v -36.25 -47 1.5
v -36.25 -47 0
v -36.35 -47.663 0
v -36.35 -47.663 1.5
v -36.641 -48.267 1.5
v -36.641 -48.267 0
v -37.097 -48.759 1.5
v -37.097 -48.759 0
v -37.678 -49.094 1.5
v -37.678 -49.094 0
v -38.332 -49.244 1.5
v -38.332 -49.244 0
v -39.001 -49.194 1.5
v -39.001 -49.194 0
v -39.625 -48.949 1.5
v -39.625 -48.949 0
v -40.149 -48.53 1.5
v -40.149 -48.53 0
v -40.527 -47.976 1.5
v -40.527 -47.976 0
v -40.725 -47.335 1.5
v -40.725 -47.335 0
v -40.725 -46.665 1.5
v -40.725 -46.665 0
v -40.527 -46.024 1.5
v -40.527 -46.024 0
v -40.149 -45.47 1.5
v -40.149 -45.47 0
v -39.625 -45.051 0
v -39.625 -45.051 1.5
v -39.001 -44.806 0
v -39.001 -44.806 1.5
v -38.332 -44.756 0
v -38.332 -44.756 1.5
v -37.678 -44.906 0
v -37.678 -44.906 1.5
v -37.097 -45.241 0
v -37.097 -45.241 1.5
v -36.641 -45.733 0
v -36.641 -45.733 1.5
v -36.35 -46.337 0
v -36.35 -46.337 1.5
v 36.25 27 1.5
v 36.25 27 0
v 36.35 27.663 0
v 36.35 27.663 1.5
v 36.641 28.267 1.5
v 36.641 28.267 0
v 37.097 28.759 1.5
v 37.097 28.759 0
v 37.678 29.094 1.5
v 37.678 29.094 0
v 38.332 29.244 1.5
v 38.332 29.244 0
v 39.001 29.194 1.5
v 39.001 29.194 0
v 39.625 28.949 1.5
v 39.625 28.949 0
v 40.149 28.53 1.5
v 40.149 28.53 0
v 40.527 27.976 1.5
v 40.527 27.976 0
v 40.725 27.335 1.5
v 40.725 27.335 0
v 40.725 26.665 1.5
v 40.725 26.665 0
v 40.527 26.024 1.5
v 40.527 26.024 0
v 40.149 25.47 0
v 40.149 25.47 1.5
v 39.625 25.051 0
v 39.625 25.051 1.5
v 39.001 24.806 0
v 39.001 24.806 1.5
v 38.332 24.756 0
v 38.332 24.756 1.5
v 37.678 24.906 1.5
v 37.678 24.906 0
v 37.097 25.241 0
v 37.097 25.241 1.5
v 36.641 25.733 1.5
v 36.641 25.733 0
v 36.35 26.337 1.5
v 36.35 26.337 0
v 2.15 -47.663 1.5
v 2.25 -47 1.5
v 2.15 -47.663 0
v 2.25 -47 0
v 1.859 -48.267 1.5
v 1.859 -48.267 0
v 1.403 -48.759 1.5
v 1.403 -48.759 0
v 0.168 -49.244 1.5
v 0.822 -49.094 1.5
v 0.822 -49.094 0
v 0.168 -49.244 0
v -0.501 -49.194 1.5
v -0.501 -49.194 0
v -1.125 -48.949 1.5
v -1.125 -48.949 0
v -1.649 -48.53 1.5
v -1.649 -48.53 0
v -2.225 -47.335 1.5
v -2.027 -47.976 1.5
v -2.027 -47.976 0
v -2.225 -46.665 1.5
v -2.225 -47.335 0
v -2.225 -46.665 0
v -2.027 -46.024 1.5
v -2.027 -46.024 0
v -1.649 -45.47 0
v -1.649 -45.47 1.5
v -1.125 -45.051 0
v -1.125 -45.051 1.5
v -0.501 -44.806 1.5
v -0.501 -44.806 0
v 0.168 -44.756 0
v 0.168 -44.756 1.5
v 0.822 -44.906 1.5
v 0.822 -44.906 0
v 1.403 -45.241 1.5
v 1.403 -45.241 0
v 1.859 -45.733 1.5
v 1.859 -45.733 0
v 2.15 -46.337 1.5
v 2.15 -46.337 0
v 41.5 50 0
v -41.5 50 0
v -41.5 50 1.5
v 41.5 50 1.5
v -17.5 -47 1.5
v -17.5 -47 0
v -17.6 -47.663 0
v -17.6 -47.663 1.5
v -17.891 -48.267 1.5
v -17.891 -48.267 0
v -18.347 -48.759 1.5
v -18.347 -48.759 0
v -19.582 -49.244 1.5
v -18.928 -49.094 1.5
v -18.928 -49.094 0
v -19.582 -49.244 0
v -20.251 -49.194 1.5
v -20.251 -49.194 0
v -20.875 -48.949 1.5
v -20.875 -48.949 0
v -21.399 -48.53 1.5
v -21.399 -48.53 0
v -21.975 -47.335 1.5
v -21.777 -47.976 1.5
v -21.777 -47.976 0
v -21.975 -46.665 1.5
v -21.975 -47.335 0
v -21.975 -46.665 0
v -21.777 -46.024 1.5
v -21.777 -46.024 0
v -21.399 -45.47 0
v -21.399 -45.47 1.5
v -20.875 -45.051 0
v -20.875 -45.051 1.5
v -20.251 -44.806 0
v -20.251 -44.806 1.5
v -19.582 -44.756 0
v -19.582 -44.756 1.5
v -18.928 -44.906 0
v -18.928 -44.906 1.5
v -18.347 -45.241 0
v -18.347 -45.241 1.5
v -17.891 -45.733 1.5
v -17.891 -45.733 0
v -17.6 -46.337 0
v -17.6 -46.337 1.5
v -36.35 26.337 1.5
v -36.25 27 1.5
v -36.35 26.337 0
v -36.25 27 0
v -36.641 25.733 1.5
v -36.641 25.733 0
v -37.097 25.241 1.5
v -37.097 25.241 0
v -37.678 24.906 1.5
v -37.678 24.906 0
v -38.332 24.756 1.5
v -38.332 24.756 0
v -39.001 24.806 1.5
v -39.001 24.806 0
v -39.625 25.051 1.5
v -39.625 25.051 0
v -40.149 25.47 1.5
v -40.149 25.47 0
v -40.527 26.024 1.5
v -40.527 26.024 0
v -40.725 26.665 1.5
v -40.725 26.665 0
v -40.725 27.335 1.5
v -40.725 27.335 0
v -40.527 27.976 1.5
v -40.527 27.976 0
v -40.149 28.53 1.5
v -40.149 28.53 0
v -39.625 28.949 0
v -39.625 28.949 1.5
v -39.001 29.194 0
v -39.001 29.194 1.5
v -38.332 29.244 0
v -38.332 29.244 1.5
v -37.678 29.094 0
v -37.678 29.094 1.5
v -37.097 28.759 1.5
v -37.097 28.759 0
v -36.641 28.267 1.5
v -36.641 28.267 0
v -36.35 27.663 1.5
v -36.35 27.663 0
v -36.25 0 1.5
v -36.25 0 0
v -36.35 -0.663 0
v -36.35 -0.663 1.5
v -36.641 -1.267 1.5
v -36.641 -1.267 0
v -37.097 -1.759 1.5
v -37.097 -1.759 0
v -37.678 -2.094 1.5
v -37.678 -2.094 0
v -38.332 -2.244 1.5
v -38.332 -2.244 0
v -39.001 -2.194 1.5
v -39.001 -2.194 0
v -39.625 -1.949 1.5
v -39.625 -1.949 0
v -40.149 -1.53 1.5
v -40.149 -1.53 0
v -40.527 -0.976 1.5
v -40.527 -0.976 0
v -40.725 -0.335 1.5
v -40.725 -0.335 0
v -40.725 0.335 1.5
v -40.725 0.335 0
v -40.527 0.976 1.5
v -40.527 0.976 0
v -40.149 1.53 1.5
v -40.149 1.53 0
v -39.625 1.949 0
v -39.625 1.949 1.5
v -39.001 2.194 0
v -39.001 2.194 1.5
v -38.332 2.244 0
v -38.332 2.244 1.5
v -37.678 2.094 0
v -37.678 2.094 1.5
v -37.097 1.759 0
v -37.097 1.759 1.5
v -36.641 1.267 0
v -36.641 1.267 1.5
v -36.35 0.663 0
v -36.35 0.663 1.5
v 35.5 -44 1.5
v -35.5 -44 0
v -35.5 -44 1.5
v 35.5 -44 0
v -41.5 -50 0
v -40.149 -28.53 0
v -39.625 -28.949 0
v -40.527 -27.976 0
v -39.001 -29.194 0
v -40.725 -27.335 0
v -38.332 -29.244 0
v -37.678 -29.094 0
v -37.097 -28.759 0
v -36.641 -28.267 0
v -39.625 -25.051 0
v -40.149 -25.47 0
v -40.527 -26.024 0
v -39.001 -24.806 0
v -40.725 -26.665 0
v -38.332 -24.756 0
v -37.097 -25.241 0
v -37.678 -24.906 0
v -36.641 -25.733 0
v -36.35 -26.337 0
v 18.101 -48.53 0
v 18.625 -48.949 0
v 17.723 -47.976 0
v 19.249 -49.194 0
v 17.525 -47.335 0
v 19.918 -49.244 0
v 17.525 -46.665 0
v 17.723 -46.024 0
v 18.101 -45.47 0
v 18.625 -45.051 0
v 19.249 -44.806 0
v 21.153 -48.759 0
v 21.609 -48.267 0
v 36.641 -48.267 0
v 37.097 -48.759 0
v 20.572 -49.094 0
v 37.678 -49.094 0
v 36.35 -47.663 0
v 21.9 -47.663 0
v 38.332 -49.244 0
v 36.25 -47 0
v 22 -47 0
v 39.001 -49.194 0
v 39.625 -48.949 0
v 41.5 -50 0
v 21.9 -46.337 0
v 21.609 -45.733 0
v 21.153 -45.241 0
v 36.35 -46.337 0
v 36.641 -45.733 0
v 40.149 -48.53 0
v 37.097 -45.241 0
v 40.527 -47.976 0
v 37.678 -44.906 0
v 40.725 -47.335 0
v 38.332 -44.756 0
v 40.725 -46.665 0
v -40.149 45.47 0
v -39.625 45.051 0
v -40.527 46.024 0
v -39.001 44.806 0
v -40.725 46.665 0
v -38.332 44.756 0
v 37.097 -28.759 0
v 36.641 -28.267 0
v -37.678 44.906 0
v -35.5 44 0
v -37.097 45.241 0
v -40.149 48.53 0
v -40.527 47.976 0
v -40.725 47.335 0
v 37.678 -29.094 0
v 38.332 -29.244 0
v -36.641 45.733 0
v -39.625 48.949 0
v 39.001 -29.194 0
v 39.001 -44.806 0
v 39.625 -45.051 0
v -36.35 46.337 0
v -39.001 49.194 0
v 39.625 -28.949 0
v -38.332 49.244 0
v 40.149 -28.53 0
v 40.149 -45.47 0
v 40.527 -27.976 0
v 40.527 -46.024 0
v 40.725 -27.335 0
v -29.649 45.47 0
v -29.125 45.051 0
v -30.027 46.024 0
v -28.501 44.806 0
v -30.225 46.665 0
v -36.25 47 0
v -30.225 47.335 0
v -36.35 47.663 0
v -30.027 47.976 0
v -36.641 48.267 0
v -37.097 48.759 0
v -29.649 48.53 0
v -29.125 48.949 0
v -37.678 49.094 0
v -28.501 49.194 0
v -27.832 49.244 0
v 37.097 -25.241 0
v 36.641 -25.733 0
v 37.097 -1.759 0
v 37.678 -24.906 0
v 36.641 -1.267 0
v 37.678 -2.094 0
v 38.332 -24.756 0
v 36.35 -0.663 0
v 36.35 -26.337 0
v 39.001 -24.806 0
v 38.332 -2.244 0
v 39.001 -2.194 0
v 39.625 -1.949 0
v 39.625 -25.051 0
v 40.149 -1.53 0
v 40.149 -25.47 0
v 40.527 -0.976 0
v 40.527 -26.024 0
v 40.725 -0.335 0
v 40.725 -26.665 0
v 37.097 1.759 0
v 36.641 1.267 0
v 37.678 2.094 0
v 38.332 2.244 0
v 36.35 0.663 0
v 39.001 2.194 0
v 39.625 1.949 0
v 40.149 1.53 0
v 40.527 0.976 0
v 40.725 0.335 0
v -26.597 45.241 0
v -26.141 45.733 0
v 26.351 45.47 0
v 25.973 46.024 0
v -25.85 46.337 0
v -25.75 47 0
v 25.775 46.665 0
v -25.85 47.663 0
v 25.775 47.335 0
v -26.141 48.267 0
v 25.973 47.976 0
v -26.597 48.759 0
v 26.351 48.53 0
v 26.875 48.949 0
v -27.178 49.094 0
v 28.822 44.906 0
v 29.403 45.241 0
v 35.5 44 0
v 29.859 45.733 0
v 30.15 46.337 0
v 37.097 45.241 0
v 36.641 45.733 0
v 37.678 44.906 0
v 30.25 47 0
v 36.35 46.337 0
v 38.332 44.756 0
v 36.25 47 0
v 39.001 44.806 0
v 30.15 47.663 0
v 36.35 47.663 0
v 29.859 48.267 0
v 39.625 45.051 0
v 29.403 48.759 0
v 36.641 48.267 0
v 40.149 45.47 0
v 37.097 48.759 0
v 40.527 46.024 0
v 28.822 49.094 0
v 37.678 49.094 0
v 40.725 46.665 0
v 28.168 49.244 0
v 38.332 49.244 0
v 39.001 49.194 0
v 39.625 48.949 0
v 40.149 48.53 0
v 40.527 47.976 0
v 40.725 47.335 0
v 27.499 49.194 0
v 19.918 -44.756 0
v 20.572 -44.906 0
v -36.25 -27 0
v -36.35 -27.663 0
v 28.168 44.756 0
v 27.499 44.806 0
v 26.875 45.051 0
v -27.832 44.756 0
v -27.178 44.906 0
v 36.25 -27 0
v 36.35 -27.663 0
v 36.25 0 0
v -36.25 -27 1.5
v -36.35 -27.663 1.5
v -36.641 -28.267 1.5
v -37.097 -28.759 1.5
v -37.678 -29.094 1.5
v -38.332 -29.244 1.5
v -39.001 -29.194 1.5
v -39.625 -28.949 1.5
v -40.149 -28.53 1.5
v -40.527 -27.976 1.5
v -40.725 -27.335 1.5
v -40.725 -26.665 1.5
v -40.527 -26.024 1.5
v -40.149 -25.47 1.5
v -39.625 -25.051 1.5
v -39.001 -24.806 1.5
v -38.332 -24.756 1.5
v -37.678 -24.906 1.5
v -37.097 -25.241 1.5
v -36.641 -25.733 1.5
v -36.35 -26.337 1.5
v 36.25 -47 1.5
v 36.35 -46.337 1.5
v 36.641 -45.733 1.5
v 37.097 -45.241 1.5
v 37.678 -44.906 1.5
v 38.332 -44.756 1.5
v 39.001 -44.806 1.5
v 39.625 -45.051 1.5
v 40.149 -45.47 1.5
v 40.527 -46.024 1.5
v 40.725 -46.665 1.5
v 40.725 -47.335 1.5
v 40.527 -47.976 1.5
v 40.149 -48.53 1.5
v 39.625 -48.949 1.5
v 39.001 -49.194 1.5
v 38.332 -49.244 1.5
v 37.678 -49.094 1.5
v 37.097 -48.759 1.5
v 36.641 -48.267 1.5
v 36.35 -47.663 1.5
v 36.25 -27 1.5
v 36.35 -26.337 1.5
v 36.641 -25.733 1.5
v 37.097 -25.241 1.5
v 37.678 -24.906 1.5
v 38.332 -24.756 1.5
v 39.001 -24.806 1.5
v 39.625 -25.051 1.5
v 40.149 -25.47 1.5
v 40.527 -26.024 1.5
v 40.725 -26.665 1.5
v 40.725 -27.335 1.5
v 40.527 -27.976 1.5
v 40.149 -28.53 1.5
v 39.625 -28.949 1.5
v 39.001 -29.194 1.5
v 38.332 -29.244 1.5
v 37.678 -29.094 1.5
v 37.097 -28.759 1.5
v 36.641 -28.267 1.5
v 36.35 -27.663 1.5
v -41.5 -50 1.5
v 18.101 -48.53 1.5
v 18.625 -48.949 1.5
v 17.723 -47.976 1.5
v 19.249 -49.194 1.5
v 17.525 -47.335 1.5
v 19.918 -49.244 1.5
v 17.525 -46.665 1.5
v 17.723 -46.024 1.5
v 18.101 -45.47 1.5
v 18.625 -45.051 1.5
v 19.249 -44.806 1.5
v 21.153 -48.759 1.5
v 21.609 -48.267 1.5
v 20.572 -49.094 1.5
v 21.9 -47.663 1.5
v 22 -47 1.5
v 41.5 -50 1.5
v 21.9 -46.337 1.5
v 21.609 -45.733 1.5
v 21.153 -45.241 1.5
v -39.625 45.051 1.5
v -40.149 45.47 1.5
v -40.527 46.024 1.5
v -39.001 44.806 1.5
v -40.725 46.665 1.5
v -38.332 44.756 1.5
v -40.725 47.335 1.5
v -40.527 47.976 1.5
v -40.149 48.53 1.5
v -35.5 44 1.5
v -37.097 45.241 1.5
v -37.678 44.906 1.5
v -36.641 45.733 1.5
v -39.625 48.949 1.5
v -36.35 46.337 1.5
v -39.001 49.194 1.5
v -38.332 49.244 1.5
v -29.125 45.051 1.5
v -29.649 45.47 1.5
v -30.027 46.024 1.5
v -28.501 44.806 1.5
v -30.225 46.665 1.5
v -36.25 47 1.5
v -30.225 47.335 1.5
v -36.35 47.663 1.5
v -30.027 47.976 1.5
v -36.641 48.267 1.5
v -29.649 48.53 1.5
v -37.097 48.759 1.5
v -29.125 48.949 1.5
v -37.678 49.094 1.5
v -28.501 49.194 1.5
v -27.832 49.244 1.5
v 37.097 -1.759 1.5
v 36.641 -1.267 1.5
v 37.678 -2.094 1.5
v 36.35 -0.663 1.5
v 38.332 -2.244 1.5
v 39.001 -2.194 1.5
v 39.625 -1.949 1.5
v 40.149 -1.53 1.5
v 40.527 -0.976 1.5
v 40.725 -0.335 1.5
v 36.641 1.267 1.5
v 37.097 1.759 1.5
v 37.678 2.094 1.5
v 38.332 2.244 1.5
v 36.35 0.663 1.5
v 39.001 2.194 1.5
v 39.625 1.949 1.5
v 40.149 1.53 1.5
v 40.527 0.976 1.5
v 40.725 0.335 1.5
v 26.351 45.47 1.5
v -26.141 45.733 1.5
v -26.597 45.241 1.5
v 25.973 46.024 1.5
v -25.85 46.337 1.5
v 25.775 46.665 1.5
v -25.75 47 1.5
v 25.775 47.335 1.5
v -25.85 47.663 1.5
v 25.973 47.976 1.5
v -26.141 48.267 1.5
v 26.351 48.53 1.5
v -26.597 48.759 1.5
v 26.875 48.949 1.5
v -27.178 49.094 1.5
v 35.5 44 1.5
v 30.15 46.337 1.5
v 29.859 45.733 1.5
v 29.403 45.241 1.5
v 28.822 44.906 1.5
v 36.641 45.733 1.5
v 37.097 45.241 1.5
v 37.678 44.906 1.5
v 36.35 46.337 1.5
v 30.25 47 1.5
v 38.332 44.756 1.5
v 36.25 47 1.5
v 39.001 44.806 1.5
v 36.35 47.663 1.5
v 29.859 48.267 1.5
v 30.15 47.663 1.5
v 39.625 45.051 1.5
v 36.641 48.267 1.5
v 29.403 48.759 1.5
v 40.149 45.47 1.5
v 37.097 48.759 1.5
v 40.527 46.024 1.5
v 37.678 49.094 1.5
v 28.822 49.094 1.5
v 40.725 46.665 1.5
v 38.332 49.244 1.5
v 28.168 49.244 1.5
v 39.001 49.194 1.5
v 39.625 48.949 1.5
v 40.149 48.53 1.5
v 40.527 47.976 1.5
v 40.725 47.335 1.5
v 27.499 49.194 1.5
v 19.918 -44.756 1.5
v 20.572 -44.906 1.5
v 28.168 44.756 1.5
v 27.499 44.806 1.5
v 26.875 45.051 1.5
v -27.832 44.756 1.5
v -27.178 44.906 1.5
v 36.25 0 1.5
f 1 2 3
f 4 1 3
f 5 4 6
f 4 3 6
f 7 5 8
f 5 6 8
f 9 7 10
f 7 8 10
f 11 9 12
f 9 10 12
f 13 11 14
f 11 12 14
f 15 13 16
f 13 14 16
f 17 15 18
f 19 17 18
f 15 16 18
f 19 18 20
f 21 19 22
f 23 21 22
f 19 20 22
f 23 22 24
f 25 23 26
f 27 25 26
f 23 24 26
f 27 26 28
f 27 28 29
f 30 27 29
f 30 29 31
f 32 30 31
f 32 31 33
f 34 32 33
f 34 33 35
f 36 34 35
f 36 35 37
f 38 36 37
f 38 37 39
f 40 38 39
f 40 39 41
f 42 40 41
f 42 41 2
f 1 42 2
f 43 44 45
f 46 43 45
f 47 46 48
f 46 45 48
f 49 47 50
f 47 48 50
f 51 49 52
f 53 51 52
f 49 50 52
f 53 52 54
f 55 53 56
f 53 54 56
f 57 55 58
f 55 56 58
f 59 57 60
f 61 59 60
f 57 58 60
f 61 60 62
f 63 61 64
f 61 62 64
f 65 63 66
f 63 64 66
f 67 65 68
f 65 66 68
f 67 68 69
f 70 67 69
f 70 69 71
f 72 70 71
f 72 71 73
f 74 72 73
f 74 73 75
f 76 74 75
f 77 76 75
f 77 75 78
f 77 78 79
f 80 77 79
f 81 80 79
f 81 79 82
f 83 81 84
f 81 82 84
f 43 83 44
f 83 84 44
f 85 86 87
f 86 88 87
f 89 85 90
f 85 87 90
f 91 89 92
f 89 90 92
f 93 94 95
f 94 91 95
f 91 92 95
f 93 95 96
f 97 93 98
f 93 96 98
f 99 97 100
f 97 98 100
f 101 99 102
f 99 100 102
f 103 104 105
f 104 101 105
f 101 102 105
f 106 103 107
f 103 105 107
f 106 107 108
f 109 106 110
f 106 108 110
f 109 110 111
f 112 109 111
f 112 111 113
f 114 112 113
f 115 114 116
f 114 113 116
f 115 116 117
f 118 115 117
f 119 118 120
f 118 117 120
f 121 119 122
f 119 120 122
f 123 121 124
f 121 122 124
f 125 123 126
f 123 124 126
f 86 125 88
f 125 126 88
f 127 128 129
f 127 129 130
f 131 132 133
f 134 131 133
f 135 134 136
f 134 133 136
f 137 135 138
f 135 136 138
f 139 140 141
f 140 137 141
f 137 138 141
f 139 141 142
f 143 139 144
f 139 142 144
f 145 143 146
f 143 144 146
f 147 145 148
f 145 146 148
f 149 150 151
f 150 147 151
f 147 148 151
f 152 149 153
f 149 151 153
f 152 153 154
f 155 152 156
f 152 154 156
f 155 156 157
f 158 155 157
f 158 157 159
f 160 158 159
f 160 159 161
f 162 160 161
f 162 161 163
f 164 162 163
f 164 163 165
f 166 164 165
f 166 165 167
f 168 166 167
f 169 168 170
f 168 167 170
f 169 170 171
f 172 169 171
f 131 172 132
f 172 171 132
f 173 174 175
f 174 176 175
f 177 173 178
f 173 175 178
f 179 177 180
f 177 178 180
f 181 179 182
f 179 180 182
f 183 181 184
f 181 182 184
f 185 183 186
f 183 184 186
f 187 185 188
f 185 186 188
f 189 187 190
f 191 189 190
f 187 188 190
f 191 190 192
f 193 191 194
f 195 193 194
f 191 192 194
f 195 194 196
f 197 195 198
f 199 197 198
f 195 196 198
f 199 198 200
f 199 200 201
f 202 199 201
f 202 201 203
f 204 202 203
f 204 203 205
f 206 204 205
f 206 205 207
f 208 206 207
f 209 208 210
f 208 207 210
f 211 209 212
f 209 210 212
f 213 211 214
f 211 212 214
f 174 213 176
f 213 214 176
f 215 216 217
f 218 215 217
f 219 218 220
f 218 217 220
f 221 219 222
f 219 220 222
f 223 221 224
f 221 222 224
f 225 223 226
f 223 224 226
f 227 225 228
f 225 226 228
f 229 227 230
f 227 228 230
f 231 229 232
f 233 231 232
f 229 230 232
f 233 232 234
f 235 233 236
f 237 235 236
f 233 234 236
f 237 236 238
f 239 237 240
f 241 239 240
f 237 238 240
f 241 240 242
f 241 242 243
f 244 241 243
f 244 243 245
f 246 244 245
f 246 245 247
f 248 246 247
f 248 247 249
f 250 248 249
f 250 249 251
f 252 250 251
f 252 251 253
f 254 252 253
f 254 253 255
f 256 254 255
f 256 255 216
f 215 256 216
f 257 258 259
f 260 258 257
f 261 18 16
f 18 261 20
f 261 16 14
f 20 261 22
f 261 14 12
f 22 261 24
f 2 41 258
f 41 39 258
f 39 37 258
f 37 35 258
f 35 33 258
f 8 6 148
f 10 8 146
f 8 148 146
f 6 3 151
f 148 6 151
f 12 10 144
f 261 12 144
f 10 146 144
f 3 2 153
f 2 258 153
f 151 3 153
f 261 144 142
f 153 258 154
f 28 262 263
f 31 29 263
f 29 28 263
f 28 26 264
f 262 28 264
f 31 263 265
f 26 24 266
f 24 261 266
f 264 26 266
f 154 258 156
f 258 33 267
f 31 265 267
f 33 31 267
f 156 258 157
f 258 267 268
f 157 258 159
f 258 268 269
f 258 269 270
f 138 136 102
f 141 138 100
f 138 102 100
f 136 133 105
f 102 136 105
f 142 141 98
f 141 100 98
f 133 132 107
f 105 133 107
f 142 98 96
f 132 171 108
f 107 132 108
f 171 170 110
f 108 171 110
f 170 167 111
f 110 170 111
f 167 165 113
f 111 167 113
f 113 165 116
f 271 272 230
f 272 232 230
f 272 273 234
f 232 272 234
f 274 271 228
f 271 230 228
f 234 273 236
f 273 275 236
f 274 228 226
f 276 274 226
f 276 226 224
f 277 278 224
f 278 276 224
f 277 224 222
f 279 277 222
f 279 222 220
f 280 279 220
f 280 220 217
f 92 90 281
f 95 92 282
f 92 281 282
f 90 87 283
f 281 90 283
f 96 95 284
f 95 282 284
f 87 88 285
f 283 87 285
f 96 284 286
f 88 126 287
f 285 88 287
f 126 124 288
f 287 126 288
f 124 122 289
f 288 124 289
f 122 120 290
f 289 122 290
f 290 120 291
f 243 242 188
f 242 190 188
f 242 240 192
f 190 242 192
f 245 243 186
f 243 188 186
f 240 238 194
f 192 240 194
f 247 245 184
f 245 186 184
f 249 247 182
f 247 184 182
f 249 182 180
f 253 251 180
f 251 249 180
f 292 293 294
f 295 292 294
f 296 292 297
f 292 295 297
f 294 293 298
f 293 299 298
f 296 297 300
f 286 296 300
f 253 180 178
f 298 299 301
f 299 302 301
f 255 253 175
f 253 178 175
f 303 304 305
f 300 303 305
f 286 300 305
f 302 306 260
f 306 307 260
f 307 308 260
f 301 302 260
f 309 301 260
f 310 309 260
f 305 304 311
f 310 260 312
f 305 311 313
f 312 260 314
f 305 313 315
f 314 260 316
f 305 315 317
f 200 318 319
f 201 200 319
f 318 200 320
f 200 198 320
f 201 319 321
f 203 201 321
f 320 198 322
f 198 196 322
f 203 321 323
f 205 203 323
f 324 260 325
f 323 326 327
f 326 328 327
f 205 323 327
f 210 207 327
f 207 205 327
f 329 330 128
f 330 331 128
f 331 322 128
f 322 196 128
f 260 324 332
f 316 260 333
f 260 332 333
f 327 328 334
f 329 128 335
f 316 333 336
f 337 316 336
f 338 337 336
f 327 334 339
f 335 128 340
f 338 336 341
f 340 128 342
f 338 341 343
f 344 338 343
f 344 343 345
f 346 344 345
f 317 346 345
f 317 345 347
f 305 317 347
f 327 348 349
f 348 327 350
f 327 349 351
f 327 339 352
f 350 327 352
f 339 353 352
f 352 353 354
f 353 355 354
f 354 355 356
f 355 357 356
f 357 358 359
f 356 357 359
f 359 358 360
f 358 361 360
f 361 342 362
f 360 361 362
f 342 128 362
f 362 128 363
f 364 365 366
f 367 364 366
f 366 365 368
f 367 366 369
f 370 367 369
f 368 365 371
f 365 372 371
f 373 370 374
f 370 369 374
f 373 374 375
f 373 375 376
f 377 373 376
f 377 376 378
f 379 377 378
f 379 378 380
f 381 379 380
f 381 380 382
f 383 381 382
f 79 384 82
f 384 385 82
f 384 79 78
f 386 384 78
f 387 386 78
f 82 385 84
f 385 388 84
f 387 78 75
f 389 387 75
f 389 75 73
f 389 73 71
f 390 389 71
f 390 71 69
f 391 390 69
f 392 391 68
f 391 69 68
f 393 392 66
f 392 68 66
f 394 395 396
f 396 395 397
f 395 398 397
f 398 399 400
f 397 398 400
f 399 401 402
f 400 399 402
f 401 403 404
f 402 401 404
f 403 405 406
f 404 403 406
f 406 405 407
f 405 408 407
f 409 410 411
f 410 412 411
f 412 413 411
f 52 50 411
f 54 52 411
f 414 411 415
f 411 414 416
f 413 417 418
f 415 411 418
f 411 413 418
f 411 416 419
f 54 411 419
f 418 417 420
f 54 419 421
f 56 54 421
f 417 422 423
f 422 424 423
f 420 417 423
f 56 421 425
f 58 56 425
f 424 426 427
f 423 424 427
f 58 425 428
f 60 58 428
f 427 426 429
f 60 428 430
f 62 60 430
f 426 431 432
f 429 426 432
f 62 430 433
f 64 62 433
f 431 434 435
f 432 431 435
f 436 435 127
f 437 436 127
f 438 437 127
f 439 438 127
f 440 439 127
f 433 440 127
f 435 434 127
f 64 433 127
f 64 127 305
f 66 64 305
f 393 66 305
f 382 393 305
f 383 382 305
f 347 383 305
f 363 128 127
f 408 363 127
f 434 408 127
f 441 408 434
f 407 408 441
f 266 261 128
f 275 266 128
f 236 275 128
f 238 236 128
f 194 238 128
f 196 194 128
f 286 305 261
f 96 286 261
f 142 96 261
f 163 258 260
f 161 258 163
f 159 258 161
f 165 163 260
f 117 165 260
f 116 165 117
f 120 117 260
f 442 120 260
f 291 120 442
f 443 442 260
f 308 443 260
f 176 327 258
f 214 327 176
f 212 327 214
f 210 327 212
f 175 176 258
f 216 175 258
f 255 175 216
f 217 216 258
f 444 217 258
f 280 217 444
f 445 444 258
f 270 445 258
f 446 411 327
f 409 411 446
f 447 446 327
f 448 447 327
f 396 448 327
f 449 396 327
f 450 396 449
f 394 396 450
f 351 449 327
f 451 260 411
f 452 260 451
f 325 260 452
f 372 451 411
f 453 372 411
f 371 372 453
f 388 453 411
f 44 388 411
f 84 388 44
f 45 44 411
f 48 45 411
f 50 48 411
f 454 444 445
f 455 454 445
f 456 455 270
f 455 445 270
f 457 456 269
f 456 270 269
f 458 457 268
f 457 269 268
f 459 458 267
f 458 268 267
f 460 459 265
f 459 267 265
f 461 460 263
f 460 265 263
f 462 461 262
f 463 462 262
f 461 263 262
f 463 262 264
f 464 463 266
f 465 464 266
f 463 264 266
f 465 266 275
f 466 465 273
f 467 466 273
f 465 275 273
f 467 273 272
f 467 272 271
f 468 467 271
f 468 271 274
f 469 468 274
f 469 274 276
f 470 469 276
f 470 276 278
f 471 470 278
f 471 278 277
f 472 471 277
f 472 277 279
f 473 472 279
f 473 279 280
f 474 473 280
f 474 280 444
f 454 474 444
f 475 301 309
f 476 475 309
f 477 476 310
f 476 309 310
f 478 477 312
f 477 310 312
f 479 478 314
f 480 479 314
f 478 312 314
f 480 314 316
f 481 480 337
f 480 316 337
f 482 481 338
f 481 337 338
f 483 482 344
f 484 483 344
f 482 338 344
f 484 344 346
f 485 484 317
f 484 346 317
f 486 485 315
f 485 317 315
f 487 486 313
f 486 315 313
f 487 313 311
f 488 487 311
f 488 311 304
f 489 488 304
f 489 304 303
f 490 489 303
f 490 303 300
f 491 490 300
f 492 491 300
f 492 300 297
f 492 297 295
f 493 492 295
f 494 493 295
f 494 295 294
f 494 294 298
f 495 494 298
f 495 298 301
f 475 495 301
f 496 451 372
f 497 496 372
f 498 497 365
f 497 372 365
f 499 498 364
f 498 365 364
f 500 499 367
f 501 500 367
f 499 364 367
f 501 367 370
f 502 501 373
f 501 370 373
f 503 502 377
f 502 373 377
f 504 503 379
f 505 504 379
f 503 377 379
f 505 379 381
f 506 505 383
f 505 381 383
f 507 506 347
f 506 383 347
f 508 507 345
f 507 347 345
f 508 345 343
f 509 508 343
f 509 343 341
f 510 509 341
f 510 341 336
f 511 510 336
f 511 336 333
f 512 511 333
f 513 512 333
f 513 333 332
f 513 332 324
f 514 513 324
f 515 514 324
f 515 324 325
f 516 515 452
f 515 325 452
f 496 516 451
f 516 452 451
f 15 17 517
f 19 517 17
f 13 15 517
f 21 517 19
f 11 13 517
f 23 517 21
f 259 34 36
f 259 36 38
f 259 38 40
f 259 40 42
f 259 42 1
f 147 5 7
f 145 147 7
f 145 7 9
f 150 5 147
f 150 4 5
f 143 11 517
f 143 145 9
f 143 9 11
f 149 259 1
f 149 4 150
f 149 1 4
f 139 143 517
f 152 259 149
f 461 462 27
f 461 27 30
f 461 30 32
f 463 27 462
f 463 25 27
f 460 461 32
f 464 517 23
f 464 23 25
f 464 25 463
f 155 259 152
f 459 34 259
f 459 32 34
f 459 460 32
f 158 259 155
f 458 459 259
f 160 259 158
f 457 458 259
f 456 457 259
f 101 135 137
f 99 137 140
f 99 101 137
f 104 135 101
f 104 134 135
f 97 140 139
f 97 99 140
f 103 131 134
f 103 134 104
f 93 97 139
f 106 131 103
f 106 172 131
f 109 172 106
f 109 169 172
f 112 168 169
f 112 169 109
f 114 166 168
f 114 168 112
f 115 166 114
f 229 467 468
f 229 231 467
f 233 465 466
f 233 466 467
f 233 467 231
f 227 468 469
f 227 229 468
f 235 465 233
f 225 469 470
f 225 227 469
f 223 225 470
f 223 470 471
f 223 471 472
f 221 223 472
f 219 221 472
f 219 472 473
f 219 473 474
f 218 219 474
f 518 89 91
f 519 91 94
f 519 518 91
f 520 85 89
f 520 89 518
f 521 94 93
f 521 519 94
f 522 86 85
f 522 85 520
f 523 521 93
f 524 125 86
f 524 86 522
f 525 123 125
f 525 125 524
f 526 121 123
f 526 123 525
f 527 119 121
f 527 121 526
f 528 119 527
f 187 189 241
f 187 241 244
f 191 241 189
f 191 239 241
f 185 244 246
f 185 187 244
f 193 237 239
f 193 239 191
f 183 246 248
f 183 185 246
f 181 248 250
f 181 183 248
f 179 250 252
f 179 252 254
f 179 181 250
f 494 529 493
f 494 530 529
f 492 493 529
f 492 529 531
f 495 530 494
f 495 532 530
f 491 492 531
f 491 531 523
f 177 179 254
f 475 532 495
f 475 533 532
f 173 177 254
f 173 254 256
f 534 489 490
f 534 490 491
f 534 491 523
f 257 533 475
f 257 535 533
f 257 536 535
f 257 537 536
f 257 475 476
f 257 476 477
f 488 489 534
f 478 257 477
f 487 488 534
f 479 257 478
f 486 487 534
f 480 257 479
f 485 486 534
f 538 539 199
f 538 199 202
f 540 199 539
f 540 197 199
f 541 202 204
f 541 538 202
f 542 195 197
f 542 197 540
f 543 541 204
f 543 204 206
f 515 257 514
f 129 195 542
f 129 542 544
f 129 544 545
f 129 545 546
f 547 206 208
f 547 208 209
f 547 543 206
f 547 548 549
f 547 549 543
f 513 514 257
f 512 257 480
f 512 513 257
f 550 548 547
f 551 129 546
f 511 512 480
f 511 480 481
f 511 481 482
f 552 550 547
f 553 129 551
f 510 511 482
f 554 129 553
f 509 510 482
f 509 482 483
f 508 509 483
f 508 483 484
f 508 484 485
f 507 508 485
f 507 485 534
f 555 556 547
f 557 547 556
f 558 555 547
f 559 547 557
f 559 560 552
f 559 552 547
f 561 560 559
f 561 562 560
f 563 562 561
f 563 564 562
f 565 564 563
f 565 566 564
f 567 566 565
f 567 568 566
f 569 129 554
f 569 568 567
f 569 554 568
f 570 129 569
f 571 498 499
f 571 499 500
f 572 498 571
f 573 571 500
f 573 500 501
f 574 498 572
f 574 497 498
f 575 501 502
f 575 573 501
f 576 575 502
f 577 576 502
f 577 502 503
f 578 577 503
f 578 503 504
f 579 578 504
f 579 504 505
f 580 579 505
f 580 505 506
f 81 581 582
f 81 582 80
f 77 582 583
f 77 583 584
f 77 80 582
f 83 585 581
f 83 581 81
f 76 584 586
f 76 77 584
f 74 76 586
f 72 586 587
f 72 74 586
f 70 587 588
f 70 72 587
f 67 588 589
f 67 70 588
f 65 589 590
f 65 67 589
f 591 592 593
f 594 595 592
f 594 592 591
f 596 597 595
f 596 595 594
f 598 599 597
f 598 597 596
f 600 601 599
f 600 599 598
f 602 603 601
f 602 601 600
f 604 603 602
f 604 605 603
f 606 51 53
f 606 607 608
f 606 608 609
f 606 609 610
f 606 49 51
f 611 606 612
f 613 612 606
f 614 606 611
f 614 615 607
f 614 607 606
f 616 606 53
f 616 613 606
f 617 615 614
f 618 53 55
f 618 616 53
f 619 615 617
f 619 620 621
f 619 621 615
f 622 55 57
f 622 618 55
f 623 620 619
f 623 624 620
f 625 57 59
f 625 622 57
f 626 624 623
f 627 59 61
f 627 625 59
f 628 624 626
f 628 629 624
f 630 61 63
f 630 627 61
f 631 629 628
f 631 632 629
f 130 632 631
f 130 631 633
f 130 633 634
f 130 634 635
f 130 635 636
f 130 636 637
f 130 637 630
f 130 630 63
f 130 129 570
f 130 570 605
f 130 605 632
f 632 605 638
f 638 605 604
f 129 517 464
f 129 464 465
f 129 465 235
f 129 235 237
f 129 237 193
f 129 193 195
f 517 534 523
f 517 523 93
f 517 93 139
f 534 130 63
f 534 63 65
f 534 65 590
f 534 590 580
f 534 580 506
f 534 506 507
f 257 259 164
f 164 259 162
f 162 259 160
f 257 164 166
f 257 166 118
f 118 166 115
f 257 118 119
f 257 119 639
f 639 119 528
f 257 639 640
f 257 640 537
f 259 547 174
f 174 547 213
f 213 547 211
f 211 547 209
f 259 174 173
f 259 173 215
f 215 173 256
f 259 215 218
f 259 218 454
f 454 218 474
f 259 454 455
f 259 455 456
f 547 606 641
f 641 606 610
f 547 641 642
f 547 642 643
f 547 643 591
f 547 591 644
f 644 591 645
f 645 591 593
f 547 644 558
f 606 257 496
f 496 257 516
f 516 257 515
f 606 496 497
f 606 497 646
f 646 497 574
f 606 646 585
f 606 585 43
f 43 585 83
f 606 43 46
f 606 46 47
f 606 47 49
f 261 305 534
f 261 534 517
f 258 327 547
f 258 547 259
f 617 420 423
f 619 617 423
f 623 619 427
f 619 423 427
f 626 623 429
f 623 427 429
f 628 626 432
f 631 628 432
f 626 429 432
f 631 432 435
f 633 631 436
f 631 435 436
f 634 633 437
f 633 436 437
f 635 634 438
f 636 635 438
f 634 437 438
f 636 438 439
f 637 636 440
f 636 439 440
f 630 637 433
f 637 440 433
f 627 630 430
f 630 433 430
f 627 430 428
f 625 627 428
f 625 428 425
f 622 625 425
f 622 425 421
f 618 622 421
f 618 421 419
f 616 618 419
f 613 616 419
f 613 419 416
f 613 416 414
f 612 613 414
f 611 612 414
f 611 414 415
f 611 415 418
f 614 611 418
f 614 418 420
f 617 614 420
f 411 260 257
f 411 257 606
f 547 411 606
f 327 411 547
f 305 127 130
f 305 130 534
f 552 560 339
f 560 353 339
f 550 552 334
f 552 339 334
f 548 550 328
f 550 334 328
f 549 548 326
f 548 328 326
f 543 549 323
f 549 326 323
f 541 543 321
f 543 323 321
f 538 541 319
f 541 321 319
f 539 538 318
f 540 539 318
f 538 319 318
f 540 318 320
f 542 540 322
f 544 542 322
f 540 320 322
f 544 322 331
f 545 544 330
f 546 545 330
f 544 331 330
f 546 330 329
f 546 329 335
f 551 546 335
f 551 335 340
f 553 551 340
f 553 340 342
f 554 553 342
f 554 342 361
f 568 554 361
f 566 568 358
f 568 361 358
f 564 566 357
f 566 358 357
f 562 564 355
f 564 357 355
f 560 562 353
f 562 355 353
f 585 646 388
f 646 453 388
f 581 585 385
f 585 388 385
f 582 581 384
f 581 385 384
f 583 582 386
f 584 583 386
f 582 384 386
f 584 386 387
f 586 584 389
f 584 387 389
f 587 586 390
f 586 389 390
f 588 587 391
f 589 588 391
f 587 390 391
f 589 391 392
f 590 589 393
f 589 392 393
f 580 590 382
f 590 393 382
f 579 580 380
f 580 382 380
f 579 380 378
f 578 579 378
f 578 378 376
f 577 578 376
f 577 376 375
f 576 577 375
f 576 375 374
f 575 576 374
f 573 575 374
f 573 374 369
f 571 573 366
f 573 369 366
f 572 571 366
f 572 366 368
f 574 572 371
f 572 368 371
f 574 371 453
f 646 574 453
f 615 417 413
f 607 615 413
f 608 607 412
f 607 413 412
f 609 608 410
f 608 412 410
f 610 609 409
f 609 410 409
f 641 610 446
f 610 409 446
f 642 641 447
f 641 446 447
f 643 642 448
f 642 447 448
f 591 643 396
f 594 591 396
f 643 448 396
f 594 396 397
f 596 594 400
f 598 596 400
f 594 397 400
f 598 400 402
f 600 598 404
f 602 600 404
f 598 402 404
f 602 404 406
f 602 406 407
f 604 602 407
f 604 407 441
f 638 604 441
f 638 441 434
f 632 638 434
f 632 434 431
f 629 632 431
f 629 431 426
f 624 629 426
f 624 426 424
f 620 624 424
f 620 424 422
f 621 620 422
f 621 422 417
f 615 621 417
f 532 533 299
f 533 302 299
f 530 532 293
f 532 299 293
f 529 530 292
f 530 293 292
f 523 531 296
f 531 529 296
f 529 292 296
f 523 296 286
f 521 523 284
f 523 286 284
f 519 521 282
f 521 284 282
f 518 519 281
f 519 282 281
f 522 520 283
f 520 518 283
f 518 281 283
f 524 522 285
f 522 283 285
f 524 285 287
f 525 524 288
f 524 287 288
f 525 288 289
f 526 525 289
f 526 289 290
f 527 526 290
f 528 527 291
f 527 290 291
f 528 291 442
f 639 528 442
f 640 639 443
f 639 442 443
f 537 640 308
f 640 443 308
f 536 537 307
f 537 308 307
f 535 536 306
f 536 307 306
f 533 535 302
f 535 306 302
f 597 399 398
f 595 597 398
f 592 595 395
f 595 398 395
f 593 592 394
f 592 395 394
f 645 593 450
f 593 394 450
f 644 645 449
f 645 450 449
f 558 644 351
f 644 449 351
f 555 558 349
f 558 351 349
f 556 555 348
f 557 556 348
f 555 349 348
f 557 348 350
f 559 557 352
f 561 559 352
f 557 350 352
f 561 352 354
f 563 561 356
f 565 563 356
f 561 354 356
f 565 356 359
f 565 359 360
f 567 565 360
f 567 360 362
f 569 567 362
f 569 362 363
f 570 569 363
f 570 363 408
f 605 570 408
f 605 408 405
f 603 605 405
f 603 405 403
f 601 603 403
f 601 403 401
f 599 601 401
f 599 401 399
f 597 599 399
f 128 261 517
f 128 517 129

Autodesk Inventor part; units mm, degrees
ref_plane "YZ Plane" through (0, 0, 0) normal (1, 0, 0) x (0, 1, 0)
ref_plane "XZ Plane" through (0, 0, 0) normal (0, 1, 0) x (-1, 0, 0)
ref_plane "XY Plane" through (0, 0, 0) normal (0, 0, 1) x (1, 0, 0)
sketch "Sketch1" plane through (0, 0, 0) normal (0, 0, 1) x (1, 0, 0)
  line L0 (-41.5, 50) -> (41.5, 50)
  line L1 (41.5, 50) -> (41.5, -50)
  line L2 (41.5, -50) -> (-41.5, -50)
  line L3 (-41.5, -50) -> (-41.5, 50)
  line L4 (35.5, 44) -> (-35.5, 44)
  line L5 (-35.5, 44) -> (-35.5, -44)
  line L6 (-35.5, -44) -> (35.5, -44)
  line L7 (35.5, -44) -> (35.5, 44)
  line L8 (-41.5, -47) -> (41.5, -47) construction
  circle A0 centre (-19.75, -47) radius 2.25
  line L9 (0, 71.7466) -> (0, -78.0681) construction
  circle A1 centre (0, -47) radius 2.25
  circle A2 centre (19.75, -47) radius 2.25
  line L10 (-60.2597, 0) -> (74.2823, 0) construction
  line L11 (-38.5, 50) -> (-38.5, -50) construction
  circle A3 centre (-38.5, 0) radius 2.25
  circle A4 centre (-38.5, 27) radius 2.25
  circle A5 centre (-38.5, -27) radius 2.25
  line L12 (-41.5, 47) -> (41.5, 47) construction
  line L13 (-35.5, -3) -> (-35.5, 3)
  circle A6 centre (-38.5, 47) radius 2.25
  circle A7 centre (-38.5, -47) radius 2.25
  line L14 (-25, 50) -> (25, 50)
  line L15 (25, 50) -> (25, 47)
  line L16 (25, 47) -> (-25, 47)
  line L17 (-25, 47) -> (-25, 50)
  circle A8 centre (-28, 47) radius 2.25
  circle A9 centre (28, 47) radius 2.25
  point P0 (0, 0)
  point P1 (0, 50)
  point P2 (41.5, 0)
  point P3 (0, 47)
  point P4 (0, 47)
  dimension "d0" = 83
  dimension "d1" = 100
  dimension "d2" = 4.5
  dimension "d3" = 4.5
  dimension "d4" = 4.5
  dimension "d5" = 3
  dimension "d6" = 3
  dimension "d9" = 3
  dimension "d10" = 4.5
  dimension "d11" = 4.5
  dimension "d12" = 4.5
  dimension "d17" = 3
  dimension "d41" = 4.5
  dimension "d42" = 4.5
  dimension "d45" = 29.25
  dimension "d46" = 29.25
  dimension "d47" = 22
  dimension "d48" = 22
  dimension "d66" = 50
  dimension "d67" = 3
  dimension "d81" = 4.5
  dimension "d82" = 4.5
  dimension "d83" = 3
  dimension "d84" = 3
extrude "Extrusion1" add sketch "Sketch1" along normal blind 1.5 contours L0 L17 L16 L15 L1 L2 L3 | L0 L15 L16 L17 | A3 | A4 | A5 | A6 | A7 | A8 | A9
extrude "Extrusion2" cut sketch "Sketch1" along normal blind 10 contours A3 | A4 | A5 | A6 | A7
mirror "Mirror1" about plane through (0, 0, 0) normal (1, 0, 0) of "Extrusion2"
extrude "Extrusion7" cut sketch "Sketch1" along normal blind 10 contours A8 | A9
properties part number "Side" material "ABS Plastic"
